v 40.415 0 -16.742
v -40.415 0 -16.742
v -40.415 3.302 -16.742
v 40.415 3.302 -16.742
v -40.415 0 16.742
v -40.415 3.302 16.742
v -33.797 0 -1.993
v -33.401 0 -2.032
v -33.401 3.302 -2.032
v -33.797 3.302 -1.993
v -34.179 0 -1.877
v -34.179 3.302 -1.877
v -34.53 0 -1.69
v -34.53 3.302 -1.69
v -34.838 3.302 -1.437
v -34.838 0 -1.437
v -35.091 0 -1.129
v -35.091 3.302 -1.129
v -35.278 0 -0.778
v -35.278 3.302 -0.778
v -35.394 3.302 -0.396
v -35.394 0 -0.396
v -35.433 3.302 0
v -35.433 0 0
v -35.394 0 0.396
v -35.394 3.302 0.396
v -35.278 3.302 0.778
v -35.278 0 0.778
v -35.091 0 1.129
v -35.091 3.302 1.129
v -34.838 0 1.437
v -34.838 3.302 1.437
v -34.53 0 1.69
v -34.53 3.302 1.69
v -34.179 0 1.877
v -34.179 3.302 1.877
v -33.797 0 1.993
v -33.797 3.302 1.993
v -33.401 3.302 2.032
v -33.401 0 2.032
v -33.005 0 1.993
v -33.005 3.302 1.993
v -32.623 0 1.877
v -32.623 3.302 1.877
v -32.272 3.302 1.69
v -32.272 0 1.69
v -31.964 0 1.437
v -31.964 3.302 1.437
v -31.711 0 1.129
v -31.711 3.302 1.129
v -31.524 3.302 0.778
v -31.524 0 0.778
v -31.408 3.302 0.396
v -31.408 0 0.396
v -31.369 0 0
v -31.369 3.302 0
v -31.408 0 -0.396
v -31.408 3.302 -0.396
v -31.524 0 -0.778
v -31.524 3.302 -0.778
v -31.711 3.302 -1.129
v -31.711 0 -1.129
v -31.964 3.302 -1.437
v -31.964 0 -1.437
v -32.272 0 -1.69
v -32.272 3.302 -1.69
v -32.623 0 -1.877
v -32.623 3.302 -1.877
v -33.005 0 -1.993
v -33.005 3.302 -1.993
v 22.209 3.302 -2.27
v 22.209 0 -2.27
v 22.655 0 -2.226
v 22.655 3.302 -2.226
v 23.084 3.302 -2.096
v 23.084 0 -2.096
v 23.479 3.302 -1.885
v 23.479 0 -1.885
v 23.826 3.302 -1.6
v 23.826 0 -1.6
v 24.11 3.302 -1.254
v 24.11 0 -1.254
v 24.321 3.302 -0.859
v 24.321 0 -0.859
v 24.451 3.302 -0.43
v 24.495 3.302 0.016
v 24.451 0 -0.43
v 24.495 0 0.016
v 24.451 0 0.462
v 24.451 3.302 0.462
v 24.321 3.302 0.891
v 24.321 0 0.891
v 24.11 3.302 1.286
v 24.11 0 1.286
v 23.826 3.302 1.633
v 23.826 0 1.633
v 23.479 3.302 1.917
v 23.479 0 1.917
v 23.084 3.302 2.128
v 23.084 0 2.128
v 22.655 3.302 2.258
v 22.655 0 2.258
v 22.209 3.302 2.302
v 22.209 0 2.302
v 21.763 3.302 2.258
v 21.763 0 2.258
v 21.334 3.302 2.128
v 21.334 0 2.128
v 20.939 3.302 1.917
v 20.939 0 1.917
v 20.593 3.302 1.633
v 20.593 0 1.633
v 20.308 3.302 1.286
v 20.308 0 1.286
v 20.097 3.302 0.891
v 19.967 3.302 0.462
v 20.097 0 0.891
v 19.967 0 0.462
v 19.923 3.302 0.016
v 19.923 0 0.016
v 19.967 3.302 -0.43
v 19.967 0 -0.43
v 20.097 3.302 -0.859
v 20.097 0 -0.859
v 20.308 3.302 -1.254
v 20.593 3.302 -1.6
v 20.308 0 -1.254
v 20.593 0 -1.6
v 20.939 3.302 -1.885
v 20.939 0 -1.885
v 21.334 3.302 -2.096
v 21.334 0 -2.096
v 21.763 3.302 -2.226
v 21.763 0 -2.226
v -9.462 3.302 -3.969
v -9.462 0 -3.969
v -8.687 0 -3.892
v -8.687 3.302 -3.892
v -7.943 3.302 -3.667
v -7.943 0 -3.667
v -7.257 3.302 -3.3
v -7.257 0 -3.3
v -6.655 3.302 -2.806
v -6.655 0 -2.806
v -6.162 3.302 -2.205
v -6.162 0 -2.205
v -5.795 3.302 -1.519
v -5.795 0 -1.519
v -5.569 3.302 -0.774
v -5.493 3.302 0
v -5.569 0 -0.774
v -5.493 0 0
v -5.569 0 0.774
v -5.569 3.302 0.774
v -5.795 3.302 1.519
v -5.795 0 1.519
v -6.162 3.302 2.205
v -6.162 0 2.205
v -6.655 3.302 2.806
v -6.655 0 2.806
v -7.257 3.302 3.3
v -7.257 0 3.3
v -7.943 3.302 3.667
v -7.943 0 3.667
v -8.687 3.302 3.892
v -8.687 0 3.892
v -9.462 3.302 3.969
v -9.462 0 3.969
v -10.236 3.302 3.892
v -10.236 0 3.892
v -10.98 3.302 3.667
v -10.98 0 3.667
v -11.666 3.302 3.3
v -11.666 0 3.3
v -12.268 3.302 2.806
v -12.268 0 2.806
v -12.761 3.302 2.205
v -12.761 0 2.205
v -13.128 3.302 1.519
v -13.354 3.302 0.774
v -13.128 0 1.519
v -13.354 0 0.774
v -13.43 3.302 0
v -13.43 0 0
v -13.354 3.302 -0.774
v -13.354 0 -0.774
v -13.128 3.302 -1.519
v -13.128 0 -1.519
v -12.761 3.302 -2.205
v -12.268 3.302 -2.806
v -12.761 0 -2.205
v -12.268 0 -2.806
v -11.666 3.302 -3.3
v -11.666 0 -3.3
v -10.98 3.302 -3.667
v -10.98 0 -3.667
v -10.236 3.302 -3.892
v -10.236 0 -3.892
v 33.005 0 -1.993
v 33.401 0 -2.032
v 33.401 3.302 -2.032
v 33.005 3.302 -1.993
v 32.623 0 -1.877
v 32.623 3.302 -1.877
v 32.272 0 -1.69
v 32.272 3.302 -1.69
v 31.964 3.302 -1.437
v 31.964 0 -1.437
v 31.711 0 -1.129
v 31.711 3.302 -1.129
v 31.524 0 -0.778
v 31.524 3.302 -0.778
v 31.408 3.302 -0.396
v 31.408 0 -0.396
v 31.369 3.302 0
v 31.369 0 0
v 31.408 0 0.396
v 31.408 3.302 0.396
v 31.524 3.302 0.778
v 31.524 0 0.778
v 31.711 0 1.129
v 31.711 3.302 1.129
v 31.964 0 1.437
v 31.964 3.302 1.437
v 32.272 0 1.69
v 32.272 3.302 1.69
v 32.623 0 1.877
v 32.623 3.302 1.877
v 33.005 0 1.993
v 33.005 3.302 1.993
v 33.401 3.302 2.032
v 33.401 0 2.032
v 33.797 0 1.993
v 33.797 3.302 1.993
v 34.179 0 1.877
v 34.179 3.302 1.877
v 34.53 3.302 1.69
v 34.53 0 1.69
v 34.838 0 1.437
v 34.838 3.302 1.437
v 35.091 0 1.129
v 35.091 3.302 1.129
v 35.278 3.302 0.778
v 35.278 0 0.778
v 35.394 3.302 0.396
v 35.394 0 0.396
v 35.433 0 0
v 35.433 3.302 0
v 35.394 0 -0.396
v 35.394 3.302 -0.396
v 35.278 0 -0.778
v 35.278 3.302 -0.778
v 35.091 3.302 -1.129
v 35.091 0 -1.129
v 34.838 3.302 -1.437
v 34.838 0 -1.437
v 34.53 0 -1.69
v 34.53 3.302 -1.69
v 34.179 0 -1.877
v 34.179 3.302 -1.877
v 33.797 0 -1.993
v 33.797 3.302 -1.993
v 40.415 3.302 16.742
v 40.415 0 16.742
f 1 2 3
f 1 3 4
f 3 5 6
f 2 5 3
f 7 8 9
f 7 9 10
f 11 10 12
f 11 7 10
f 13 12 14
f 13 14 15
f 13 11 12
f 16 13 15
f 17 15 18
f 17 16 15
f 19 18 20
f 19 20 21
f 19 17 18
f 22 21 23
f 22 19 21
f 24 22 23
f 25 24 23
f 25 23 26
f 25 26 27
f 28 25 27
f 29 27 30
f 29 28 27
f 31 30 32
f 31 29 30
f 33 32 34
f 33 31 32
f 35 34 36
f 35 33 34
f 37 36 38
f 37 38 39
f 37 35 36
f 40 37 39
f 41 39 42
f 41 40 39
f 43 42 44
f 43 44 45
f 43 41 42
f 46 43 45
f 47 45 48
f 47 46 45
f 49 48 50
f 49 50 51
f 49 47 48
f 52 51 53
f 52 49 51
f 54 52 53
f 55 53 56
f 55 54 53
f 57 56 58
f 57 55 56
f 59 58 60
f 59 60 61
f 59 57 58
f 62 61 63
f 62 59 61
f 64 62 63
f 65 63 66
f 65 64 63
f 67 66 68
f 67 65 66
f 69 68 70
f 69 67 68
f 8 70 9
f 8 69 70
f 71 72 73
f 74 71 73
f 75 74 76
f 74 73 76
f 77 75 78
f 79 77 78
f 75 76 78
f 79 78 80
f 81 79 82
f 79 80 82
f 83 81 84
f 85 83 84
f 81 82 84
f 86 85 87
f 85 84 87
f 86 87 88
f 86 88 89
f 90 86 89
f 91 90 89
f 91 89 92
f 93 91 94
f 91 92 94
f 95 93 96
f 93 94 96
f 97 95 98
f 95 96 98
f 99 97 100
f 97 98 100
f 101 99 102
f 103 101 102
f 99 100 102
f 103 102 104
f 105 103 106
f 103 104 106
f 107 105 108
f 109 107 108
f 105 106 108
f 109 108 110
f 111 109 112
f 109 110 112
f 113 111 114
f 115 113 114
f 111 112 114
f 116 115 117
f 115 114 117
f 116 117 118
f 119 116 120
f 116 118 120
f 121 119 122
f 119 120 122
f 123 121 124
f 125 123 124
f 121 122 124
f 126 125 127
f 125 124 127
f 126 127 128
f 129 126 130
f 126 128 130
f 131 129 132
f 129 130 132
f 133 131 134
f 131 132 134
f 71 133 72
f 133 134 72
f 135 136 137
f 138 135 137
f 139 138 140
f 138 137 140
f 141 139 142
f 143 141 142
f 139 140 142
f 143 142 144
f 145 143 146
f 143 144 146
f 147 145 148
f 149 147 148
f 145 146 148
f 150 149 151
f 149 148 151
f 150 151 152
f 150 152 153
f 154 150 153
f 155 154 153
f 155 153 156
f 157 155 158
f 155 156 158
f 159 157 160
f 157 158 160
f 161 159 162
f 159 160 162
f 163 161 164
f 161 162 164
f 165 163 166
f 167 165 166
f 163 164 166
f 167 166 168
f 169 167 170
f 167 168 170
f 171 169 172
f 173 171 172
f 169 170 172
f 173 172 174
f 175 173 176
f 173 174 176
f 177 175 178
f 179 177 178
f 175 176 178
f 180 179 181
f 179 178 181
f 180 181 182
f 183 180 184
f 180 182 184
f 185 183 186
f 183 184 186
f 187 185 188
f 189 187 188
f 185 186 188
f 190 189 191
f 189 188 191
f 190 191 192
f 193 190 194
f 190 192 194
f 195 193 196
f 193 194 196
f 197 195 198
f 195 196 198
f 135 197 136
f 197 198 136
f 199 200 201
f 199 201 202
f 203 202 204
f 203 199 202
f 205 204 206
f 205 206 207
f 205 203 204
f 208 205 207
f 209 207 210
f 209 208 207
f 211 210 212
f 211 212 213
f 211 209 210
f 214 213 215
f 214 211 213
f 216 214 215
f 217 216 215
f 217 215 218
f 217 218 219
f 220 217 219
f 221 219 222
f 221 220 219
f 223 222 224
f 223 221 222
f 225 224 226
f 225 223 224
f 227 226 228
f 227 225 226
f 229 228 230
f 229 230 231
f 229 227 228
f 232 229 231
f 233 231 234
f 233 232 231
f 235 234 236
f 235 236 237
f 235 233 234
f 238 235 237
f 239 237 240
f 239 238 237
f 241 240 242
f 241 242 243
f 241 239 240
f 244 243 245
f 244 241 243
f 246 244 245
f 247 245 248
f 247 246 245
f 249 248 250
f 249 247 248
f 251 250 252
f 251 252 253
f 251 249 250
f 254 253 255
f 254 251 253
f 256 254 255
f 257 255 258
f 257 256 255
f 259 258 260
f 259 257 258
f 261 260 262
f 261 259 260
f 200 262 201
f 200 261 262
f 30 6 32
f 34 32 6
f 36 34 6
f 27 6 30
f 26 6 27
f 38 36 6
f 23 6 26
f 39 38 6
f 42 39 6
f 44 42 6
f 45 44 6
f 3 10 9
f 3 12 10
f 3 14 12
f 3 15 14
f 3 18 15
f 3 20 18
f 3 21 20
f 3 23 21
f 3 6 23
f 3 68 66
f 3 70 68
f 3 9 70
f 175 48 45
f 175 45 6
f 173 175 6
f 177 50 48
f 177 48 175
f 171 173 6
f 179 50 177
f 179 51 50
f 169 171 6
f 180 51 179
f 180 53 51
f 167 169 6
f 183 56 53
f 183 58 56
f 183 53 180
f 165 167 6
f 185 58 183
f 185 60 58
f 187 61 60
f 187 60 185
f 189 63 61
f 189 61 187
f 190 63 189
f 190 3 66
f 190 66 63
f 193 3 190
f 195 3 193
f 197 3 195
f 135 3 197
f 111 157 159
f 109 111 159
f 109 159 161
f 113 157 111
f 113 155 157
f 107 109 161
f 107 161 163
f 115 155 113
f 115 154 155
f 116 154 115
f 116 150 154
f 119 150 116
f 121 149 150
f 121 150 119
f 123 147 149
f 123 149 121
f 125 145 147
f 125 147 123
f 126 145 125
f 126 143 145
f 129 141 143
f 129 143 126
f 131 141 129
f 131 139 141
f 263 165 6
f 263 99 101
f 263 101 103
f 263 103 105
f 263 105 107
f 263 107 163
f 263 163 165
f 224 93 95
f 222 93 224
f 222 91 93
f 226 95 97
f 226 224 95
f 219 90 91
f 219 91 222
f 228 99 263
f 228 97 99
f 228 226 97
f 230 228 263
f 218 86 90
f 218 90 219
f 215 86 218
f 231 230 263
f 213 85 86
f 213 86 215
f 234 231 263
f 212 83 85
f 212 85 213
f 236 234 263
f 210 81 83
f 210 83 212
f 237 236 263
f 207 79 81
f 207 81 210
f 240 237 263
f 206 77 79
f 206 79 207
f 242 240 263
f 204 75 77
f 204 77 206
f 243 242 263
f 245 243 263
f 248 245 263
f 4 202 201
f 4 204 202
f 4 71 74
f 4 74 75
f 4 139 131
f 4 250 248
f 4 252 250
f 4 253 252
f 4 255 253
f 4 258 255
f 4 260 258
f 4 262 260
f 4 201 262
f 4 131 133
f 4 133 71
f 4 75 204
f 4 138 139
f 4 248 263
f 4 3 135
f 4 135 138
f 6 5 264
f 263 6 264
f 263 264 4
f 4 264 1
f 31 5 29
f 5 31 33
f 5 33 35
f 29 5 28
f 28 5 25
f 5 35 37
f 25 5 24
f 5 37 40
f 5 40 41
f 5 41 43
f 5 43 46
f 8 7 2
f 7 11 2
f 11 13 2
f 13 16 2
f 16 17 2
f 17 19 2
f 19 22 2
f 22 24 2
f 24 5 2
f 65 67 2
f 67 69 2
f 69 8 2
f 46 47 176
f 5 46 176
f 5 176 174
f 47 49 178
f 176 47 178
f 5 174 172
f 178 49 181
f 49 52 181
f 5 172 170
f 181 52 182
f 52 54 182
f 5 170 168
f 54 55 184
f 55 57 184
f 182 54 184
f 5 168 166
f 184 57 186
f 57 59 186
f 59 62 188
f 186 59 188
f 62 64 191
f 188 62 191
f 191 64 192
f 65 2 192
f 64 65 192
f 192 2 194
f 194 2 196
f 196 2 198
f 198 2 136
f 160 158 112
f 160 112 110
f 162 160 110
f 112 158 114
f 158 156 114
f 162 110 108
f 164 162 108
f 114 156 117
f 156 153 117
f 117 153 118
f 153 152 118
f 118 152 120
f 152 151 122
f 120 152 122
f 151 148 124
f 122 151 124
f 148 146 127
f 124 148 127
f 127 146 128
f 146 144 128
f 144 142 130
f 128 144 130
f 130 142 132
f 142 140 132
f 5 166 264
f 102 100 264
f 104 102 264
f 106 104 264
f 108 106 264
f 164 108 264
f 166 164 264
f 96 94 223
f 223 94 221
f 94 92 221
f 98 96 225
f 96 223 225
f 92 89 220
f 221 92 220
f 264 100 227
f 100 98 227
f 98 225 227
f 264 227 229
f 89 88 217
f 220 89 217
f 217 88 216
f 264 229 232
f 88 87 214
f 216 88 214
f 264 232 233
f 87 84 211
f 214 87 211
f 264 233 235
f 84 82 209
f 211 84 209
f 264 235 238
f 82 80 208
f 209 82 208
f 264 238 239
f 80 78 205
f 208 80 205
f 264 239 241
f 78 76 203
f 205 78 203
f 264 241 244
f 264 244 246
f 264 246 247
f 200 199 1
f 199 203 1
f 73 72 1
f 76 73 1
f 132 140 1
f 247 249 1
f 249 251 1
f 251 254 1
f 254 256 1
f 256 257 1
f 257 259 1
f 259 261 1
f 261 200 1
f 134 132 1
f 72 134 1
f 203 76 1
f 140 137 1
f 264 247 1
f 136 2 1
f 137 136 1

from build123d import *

# Parameters (mm, degrees)
SKETCH1_W           = 80.830931362
SKETCH1_H           = 33.48304161
SKETCH1_R           = 2.032
BOSS_EXTRUDE1_DEPTH = 3.302
SKETCH2_R           = 3.96875
SKETCH2_R_2         = 2.286
CUT_EXTRUDE1_DEPTH  = 3.302


with BuildPart() as part:
    # Sketch1 → Boss-Extrude1 (new body)
    with BuildSketch(Plane(origin=(0, 0, 0), x_dir=(1, 0, 0), z_dir=(0, 1, 0))):
        Rectangle(SKETCH1_W, SKETCH1_H)
        with Locations(Location((-33.401, 0, 0), (0, 0, 90))):
            Circle(SKETCH1_R, mode=Mode.SUBTRACT)
        with Locations(Location((33.401, 0, 0), (0, 0, 90))):
            Circle(SKETCH1_R, mode=Mode.SUBTRACT)
    extrude(amount=BOSS_EXTRUDE1_DEPTH)

    # Sketch2 → Cut-Extrude1 (cut)
    with BuildSketch(Plane.XZ):
        with Locations(Location((-9.4615, 0, 0), (0, 0, 270))):
            Circle(SKETCH2_R)
        with Locations(Location((22.209125, 0.016190079, 0), (0, 0, 270))):
            Circle(SKETCH2_R_2)
    extrude(amount=-CUT_EXTRUDE1_DEPTH, mode=Mode.SUBTRACT)


solid = part.part
